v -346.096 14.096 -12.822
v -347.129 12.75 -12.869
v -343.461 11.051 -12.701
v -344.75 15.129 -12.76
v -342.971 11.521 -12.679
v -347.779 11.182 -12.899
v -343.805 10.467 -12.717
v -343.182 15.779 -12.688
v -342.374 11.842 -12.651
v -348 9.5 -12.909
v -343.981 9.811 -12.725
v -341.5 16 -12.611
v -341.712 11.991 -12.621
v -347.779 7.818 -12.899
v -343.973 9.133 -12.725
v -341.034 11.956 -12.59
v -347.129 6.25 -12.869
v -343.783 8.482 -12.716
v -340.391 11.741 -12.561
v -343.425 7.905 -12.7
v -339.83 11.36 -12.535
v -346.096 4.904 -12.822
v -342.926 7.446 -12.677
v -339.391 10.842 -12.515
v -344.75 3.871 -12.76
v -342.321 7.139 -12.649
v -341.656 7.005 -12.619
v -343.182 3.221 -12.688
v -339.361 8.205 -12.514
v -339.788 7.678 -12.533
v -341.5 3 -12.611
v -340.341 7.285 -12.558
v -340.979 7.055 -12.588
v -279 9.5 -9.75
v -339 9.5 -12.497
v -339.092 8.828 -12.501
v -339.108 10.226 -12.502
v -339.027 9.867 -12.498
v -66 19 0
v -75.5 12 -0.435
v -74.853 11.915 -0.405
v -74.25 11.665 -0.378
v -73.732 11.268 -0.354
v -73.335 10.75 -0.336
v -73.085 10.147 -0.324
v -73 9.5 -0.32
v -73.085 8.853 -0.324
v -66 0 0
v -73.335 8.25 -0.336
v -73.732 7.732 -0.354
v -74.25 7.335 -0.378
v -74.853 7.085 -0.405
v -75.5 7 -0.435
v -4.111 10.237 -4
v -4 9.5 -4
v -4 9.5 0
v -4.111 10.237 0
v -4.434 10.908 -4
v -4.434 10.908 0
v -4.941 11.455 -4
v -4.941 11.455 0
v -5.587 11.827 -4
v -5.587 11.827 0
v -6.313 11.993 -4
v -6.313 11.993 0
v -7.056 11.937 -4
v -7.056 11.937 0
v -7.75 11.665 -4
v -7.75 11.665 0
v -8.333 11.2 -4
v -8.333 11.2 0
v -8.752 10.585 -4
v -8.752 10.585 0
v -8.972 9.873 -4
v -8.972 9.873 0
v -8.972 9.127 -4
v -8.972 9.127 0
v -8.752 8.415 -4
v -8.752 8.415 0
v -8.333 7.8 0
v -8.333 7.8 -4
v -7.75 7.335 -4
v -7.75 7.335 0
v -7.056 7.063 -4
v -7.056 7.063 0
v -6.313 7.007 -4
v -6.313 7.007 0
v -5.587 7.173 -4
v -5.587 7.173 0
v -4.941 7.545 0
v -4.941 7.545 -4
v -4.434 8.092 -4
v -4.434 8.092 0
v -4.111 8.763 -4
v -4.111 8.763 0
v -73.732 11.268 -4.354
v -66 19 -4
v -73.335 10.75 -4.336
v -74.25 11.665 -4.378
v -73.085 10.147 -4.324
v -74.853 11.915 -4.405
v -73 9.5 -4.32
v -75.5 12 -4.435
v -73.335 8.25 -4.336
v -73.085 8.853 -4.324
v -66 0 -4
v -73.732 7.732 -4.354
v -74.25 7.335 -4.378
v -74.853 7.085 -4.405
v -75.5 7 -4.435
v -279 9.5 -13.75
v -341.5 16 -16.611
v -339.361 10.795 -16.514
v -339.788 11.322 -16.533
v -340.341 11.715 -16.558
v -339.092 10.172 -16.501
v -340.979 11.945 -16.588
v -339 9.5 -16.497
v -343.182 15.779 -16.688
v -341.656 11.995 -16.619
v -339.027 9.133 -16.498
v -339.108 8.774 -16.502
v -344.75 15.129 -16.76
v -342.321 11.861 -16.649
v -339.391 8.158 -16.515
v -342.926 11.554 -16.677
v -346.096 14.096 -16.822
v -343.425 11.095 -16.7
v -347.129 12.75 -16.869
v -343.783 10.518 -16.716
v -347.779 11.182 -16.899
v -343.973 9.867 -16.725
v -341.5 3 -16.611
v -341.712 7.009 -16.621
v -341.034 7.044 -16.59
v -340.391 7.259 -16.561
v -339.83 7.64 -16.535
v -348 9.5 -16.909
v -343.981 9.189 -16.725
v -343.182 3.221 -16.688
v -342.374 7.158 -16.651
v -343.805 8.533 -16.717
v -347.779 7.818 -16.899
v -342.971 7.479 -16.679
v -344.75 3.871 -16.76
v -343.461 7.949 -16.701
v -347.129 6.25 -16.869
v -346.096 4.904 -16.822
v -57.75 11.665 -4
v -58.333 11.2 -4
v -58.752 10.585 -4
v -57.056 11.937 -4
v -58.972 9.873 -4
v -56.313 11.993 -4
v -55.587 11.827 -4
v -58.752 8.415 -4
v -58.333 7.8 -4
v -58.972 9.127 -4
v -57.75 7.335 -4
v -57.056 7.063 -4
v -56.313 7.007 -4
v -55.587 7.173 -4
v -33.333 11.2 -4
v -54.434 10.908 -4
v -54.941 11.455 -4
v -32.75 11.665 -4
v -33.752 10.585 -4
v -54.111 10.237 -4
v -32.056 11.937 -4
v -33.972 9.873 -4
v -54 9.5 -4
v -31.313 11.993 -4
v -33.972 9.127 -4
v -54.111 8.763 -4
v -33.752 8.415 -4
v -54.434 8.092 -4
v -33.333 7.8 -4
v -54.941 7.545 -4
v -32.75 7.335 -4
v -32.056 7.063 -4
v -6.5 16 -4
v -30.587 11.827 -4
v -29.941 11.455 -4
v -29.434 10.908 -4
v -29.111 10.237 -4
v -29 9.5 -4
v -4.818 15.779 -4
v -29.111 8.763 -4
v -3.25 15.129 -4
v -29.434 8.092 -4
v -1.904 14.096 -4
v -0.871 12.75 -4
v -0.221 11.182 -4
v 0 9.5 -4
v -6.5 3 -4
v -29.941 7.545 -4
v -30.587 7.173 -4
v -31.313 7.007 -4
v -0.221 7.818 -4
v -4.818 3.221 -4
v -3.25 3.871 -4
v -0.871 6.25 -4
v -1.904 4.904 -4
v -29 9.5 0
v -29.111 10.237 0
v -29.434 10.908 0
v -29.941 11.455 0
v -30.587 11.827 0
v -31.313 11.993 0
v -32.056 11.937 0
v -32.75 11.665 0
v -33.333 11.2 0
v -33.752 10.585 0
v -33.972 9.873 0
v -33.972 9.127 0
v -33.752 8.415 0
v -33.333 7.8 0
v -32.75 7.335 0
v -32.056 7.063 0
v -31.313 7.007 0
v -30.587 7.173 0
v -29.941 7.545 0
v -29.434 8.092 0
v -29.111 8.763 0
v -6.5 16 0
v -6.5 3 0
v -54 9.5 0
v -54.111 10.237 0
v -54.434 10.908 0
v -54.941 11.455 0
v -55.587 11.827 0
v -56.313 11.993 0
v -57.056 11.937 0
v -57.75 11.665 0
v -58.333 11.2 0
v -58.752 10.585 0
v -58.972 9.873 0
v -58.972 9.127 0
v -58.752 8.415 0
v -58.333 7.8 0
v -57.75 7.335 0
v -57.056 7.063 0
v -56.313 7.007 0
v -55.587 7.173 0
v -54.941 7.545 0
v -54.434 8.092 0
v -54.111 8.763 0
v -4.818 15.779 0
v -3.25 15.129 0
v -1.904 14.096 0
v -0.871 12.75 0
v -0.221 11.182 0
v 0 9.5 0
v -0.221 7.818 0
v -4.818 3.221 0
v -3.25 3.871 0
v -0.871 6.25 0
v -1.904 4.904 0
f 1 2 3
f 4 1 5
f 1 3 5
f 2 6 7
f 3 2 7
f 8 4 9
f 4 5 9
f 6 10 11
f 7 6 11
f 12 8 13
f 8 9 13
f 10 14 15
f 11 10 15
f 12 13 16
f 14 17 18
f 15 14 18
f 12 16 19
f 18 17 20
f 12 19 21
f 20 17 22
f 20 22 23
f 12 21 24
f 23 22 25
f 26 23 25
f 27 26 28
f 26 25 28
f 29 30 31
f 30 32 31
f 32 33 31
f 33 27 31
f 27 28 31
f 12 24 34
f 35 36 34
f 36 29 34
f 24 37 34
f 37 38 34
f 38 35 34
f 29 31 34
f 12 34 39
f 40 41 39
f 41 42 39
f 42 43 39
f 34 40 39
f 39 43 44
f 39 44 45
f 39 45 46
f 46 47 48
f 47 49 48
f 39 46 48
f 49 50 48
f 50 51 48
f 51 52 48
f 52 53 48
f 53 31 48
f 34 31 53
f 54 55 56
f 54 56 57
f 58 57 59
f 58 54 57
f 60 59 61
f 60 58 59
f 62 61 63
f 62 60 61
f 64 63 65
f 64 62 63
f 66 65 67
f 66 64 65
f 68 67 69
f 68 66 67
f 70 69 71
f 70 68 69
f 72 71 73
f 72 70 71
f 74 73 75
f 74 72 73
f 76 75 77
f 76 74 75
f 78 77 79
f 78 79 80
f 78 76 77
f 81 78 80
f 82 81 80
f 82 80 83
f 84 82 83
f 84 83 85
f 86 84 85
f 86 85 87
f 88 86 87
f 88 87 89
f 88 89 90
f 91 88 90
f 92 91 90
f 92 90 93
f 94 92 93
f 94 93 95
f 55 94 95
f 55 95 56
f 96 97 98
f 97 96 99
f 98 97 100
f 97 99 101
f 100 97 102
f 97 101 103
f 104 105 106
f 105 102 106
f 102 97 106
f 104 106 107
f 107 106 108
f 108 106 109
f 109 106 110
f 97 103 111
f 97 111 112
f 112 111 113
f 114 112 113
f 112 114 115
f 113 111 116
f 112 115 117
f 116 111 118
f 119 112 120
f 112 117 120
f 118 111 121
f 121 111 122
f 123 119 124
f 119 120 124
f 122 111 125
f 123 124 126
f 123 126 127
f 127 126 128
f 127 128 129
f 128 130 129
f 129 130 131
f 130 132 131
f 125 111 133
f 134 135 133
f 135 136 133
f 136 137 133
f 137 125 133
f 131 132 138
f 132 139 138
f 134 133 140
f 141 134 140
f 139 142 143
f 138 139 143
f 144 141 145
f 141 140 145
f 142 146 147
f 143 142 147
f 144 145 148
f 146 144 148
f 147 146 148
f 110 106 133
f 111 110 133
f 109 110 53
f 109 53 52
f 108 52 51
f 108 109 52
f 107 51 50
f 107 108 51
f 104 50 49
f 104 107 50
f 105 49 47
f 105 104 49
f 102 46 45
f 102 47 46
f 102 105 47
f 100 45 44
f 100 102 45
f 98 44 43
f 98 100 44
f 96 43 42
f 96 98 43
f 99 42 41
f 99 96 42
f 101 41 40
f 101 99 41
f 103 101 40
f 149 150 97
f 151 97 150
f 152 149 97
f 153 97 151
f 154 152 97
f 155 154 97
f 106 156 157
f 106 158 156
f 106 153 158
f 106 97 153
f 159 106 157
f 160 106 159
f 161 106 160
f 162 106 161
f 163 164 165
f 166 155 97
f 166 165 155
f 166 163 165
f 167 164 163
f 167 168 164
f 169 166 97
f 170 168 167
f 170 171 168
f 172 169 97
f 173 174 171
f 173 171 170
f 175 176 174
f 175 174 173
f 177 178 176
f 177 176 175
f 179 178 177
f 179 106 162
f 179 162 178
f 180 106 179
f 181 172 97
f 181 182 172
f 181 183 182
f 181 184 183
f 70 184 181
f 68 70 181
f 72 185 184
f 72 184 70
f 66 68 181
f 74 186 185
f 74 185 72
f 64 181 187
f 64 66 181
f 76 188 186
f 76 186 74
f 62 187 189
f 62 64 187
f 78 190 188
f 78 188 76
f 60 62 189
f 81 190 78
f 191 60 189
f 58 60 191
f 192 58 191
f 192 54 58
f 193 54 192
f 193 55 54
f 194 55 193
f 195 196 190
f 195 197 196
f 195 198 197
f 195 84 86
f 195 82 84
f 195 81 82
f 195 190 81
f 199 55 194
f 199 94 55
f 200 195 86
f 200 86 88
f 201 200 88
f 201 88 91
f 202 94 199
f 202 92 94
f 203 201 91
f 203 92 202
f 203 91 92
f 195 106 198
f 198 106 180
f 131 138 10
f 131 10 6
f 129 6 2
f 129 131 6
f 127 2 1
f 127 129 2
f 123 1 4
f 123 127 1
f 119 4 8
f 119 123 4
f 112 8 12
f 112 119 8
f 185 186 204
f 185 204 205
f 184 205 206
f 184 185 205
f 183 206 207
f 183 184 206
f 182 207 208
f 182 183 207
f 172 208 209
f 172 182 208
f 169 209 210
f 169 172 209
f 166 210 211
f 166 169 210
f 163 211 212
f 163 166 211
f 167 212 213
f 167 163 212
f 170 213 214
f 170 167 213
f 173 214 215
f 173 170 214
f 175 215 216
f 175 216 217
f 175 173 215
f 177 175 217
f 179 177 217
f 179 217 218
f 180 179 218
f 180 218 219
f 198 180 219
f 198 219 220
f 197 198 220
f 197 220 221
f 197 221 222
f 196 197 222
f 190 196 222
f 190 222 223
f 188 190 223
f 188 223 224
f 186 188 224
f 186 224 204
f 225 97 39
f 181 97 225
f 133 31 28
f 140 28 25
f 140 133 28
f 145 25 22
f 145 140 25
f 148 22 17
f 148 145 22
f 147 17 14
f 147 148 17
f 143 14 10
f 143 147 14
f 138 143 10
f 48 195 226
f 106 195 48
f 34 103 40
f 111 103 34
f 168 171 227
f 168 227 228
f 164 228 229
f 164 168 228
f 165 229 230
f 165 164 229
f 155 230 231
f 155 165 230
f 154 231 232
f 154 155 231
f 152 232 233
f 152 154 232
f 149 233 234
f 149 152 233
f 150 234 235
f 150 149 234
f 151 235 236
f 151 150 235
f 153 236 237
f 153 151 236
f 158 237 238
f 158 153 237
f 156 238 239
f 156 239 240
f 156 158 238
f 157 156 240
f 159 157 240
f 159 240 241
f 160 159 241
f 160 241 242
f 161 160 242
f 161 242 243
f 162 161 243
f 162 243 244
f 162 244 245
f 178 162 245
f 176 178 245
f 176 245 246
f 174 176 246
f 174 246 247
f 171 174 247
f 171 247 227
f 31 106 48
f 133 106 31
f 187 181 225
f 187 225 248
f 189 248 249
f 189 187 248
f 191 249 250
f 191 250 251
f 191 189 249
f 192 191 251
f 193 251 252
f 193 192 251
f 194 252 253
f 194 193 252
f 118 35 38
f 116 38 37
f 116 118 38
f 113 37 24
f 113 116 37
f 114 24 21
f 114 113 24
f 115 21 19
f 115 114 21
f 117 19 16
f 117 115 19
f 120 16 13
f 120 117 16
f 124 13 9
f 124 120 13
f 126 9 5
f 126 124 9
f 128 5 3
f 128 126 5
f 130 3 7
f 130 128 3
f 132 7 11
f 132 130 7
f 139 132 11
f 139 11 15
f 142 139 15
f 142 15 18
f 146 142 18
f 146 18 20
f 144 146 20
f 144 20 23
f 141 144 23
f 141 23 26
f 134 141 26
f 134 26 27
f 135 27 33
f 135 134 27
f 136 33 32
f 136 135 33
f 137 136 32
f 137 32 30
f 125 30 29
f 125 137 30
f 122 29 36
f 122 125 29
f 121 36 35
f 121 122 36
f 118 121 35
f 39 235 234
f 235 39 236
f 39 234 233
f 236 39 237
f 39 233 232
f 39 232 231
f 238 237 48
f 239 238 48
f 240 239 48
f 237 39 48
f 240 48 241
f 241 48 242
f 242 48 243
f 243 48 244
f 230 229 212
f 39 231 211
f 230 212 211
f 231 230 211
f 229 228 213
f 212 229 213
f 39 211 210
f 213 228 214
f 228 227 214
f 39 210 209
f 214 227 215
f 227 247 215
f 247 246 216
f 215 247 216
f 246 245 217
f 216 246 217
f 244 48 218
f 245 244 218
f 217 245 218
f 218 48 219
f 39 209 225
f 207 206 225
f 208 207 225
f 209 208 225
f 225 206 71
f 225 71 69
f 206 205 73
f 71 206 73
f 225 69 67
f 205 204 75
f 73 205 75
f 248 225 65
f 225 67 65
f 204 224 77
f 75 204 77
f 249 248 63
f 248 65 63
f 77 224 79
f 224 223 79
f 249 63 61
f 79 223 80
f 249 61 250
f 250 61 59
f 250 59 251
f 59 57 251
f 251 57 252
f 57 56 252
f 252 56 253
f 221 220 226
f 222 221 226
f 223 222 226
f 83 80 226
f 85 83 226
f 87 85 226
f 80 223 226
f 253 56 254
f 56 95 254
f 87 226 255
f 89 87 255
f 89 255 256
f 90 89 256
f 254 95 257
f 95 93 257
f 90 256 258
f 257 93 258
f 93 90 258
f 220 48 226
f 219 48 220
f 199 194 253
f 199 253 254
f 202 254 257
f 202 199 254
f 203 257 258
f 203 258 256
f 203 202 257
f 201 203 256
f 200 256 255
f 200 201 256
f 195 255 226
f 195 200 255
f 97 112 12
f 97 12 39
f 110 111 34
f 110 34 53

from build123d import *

# Parameters (mm, degrees)
BOSS_EXTRUDE1_DEPTH = 19
SKETCH2_R           = 2.5
CUT_EXTRUDE5_DEPTH  = 40


with BuildPart() as part:
    # Sketch1 → Boss-Extrude1 (new body)
    with BuildSketch(Plane(origin=(0, 0, 0), x_dir=(1, 0, 0), z_dir=(0, 1, 0))):
        Polygon((-66, 0), (0, 0), (0, 4), (-66, 4), (-348, 16.909), (-348, 12.909), align=None)
    extrude(amount=BOSS_EXTRUDE1_DEPTH)

    # Sketch2 → Cut-Extrude5 (cut)
    with BuildSketch(Plane.XY):
        with BuildLine():
            ThreePointArc((-6.5, 16), (-1.903805922, 14.096194078), (0, 9.5))
            Line((0, 9.5), (0, 19))
            Line((0, 19), (-66, 19))
            Line((-66, 19), (-6.5, 16))
        make_face()
        with BuildLine():
            Line((0, 0), (0, 9.5))
            ThreePointArc((0, 9.5), (-1.903805922, 4.903805922), (-6.5, 3))
            Line((-6.5, 3), (-66, 0))
            Line((-66, 0), (0, 0))
        make_face()
        with Locations((-6.5, 9.5)):
            Circle(SKETCH2_R)
        with BuildLine():
            Line((-75.5, 12), (-279, 9.5))
            Line((-279, 9.5), (-75.5, 7))
            ThreePointArc((-75.5, 7), (-73, 9.5), (-75.5, 12))
        make_face()
        with BuildLine():
            Line((-341.5, 16), (-66, 19))
            Line((-66, 19), (-348, 19))
            Line((-348, 19), (-348, 9.5))
            ThreePointArc((-348, 9.5), (-346.096194078, 14.096194078), (-341.5, 16))
        make_face()
        with BuildLine():
            Line((-348, 0), (-66, 0))
            Line((-66, 0), (-341.5, 3))
            ThreePointArc((-341.5, 3), (-346.096194078, 4.903805922), (-348, 9.5))
            Line((-348, 9.5), (-348, 0))
        make_face()
        with Locations((-31.5, 9.5)):
            Circle(SKETCH2_R)
        with Locations((-341.5, 9.5)):
            Circle(SKETCH2_R)
        with Locations((-56.5, 9.5)):
            Circle(SKETCH2_R)
    extrude(amount=-CUT_EXTRUDE5_DEPTH, mode=Mode.SUBTRACT)


solid = part.part
